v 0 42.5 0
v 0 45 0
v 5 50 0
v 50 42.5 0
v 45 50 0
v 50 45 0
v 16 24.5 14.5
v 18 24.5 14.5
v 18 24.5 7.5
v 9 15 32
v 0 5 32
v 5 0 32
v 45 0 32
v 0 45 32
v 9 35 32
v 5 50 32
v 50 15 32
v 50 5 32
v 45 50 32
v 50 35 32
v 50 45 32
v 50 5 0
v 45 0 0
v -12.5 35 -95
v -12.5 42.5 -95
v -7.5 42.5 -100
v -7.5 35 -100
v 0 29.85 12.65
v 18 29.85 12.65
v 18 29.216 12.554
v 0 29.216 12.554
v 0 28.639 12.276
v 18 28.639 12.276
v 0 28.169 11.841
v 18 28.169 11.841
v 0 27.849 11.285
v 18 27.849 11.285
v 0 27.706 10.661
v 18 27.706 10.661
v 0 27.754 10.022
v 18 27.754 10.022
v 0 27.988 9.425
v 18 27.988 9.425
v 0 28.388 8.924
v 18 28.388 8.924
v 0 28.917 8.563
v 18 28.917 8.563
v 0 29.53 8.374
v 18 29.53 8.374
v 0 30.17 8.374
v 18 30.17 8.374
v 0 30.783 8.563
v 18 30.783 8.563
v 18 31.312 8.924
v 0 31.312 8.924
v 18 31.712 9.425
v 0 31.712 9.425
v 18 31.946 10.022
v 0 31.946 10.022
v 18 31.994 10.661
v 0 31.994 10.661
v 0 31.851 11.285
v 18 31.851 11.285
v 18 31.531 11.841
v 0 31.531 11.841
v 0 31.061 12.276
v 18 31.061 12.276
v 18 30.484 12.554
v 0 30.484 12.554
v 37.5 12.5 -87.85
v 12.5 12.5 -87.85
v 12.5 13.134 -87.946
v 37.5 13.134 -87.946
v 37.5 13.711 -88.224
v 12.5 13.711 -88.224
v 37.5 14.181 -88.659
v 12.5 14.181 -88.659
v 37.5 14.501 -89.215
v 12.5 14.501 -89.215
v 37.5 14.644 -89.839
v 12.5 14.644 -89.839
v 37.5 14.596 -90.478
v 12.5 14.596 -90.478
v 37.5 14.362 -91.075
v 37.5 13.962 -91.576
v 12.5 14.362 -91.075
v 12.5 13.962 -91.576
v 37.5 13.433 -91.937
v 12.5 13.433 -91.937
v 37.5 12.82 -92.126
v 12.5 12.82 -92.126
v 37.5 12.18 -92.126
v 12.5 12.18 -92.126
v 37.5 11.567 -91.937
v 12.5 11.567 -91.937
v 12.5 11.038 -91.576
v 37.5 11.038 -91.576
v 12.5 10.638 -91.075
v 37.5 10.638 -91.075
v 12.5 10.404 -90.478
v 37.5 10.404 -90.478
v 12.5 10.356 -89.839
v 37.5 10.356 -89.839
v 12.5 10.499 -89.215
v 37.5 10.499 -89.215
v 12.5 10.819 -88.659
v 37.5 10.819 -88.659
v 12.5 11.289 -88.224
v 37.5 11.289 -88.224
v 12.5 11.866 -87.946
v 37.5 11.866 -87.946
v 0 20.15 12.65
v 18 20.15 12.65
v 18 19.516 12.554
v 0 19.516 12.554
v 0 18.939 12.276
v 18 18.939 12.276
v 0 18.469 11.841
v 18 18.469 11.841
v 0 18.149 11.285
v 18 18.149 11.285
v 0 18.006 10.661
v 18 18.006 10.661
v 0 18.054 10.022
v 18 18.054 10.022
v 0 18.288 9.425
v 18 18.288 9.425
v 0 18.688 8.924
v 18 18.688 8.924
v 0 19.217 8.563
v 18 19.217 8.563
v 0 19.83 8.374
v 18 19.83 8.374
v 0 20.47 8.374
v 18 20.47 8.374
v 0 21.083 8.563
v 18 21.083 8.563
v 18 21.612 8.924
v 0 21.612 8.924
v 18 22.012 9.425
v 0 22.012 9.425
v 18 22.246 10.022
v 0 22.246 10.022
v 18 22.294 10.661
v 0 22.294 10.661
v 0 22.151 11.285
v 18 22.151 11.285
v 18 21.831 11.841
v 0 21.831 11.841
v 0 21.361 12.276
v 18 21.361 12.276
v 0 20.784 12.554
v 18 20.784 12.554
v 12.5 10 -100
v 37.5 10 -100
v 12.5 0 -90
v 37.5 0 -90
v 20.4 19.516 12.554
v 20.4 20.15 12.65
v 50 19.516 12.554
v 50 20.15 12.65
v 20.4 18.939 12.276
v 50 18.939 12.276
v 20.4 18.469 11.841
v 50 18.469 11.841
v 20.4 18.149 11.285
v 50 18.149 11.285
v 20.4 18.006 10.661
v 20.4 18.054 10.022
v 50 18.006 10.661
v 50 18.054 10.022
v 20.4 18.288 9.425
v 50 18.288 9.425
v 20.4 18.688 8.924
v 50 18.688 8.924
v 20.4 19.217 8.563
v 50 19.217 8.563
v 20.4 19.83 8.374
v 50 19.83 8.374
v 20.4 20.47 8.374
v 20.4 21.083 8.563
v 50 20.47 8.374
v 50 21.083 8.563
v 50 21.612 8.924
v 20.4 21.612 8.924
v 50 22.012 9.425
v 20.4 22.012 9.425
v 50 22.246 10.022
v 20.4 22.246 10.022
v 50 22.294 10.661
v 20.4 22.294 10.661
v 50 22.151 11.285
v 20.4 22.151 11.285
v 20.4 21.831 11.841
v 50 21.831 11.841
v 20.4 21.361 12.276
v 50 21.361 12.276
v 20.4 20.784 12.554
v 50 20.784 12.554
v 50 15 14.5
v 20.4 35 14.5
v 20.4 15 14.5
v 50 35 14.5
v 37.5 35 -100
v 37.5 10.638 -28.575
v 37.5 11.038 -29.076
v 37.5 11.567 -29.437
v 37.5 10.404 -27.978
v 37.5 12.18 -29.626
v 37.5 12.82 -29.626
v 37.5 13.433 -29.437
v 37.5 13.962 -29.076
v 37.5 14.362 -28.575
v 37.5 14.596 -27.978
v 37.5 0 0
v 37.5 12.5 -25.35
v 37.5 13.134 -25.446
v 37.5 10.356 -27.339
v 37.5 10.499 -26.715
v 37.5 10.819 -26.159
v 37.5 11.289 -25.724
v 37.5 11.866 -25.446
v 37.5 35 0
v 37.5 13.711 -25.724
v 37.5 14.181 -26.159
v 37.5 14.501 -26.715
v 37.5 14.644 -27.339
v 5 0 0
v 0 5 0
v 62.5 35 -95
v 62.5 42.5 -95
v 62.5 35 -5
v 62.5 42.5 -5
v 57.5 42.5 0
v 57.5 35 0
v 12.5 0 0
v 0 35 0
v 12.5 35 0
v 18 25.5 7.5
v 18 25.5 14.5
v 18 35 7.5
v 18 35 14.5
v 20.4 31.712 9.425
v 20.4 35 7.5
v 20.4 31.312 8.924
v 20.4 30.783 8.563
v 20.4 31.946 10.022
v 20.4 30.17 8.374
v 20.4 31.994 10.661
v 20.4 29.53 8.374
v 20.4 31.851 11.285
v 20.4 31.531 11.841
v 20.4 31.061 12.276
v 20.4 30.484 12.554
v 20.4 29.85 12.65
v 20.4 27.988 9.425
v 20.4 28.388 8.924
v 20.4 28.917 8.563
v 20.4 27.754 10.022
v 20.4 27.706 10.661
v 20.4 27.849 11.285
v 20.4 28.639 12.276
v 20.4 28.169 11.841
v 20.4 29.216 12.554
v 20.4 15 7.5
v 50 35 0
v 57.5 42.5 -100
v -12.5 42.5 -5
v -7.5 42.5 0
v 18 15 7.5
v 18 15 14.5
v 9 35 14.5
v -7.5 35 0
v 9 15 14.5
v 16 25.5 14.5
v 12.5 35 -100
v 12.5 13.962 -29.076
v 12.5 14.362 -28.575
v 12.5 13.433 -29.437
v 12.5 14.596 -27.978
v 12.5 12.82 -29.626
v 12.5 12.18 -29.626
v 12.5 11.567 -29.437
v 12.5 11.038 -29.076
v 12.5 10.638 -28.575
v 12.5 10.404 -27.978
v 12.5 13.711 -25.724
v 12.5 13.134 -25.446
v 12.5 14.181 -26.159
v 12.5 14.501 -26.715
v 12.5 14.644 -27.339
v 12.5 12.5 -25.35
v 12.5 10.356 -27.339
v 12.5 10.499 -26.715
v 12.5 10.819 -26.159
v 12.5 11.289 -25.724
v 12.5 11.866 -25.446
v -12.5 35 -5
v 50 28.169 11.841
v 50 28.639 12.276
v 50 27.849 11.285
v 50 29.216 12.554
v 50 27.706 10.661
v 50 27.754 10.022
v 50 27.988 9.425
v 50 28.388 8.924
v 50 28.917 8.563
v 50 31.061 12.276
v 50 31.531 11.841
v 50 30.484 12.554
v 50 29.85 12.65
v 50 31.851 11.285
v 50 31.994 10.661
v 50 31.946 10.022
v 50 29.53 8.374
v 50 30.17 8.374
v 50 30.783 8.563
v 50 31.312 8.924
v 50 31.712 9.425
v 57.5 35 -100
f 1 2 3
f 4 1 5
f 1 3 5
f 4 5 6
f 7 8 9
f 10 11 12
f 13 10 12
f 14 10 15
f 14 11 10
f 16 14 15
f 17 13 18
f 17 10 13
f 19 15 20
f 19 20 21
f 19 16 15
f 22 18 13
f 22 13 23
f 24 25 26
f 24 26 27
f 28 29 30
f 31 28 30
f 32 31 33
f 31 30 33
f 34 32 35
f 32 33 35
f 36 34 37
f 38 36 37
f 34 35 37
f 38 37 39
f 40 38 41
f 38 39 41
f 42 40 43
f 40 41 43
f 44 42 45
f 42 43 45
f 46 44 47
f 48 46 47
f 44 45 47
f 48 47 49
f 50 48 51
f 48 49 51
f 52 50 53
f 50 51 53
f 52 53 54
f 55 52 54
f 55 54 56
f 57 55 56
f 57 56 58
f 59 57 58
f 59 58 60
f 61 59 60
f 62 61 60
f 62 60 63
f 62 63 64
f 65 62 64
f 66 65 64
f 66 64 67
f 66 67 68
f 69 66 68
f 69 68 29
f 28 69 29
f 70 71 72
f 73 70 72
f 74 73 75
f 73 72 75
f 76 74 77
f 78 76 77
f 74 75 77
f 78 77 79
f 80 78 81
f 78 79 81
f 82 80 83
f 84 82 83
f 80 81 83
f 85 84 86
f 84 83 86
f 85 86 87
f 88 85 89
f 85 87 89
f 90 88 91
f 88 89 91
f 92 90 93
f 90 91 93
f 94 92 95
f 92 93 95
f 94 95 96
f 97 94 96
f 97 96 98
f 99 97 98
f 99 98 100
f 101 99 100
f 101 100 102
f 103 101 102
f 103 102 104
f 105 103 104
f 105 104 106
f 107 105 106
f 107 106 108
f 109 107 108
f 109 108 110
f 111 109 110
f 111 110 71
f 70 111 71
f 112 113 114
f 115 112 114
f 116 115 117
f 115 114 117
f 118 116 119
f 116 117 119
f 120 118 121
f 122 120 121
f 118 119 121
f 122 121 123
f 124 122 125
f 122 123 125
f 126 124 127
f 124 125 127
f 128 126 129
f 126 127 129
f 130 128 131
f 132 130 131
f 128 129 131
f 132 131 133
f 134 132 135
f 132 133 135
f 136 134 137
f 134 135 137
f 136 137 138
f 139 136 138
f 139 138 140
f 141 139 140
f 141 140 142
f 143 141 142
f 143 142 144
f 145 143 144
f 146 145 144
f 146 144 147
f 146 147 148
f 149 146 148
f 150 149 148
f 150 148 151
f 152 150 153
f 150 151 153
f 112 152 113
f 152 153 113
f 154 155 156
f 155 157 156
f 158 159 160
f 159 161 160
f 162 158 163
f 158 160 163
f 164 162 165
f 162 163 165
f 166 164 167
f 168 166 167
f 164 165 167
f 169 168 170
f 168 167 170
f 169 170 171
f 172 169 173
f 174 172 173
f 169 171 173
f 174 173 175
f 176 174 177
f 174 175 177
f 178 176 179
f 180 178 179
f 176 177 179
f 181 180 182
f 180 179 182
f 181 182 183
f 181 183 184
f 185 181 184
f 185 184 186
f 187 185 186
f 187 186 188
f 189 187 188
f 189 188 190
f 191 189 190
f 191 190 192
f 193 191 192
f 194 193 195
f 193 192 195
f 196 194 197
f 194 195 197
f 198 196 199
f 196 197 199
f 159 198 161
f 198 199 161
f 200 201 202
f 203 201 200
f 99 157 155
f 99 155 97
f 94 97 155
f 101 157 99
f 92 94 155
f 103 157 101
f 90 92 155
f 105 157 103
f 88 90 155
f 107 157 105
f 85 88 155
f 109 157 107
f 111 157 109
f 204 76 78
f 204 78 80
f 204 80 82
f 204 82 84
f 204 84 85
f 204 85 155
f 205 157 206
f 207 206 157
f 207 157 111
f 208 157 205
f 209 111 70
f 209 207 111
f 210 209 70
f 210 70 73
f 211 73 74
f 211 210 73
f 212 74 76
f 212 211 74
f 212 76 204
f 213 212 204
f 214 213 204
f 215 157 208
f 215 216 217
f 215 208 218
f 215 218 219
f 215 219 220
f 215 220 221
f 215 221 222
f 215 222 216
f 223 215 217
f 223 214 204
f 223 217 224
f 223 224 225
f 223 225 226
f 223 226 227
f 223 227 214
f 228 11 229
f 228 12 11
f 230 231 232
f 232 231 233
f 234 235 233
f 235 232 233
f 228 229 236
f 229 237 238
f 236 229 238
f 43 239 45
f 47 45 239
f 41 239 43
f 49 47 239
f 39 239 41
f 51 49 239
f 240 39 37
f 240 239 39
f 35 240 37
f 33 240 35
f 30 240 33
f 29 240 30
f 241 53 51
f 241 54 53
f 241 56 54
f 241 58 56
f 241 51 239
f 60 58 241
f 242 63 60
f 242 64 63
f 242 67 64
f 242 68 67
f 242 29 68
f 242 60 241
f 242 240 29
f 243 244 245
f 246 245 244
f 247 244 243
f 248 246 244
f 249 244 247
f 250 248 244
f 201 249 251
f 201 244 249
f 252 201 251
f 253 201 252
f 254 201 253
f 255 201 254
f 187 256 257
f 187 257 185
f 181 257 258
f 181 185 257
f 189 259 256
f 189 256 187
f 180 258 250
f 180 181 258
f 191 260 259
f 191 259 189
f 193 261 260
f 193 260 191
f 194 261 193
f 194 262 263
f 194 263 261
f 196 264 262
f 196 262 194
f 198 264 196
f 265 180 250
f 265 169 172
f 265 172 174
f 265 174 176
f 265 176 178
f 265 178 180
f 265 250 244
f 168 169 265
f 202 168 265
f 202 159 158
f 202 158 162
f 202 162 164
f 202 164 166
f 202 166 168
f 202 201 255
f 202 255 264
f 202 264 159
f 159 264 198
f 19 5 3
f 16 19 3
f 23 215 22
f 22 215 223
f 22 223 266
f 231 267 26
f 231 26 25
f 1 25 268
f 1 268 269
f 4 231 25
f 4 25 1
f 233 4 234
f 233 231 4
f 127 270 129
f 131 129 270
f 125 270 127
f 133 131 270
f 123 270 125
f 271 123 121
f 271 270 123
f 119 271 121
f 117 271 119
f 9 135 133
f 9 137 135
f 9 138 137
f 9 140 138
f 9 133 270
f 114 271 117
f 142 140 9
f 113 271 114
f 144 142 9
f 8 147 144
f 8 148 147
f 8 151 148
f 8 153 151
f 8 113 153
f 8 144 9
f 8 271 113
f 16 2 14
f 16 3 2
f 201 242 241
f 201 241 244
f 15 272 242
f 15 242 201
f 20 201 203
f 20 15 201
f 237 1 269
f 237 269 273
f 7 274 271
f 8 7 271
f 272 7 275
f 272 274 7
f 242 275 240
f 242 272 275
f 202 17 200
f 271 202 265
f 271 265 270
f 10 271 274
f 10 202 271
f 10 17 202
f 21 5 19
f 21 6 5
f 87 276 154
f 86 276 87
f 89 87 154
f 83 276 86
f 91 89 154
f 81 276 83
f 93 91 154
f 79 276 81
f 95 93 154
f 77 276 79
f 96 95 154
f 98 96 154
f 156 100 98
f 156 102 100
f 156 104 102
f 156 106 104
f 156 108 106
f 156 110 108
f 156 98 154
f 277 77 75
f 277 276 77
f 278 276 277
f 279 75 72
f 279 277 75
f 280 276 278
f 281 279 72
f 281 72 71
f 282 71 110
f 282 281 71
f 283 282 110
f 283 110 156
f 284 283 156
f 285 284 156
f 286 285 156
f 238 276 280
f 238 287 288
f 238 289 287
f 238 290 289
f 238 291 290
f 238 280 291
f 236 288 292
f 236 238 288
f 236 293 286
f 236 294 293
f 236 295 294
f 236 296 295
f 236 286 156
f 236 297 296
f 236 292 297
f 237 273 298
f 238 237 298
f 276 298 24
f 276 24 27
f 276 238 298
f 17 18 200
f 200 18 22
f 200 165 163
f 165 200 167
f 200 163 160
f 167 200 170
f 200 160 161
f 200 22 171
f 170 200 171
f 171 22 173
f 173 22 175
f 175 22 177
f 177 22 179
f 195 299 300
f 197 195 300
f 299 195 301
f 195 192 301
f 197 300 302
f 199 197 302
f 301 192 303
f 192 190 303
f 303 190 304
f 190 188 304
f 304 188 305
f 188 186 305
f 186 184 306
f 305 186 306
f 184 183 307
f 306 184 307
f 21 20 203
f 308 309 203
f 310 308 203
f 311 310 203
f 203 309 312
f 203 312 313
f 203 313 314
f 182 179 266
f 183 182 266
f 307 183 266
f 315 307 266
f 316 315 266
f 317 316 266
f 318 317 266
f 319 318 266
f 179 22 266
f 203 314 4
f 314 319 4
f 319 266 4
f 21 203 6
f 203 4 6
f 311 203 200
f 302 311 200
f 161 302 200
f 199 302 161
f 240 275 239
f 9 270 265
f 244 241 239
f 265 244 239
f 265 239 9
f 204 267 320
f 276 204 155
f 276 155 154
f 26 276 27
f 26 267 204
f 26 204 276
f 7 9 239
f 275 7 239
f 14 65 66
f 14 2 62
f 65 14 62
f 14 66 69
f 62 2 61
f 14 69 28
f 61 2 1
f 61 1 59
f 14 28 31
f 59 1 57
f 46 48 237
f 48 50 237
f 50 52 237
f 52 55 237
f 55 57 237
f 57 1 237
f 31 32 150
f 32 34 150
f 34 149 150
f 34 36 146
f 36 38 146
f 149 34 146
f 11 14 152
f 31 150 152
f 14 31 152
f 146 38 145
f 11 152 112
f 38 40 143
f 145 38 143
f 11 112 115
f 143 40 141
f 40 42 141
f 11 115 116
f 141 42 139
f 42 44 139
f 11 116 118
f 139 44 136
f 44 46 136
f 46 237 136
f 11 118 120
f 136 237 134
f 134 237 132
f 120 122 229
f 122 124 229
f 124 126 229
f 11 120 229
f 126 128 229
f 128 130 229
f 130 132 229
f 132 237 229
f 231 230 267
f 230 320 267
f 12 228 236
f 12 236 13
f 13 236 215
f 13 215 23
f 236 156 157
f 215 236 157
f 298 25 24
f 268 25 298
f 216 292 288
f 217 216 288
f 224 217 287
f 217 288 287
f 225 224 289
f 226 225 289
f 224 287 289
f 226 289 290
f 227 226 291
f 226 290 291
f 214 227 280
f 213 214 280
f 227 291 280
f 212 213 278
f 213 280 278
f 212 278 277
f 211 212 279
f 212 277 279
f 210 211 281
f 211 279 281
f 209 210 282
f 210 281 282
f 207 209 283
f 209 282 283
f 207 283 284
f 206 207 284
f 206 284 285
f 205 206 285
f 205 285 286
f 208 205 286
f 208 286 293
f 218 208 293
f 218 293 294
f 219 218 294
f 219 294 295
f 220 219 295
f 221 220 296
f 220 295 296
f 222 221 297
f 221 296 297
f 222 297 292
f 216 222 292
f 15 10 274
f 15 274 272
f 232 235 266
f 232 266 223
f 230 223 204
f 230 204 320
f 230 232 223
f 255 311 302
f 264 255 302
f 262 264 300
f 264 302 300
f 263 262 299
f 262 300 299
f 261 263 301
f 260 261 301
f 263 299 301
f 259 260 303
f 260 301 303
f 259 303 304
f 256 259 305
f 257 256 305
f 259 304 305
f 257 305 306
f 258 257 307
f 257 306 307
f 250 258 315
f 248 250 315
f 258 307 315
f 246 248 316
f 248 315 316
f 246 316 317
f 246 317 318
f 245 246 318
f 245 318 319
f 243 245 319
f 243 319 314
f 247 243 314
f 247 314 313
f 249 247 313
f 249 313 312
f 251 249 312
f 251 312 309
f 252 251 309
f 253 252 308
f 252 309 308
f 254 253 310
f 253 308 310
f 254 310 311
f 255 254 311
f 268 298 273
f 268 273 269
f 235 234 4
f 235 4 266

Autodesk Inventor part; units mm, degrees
ref_plane "YZ Plane" through (0, 0, 0) normal (1, 0, 0) x (0, 1, 0)
ref_plane "XZ Plane" through (0, 0, 0) normal (0, 1, 0) x (-1, 0, 0)
ref_plane "XY Plane" through (0, 0, 0) normal (0, 0, 1) x (1, 0, 0)
sketch "Sketch1" plane through (0, 0, 0) normal (0, 0, 1) x (1, 0, 0)
  line L0 (0, 0) -> (50, 0)
  line L1 (50, 0) -> (50, 50)
  line L2 (50, 50) -> (0, 50)
  line L3 (0, 50) -> (0, 0)
  dimension "d0" = 50
  dimension "d1" = 50
extrude "Extrusion1" add sketch "Sketch1" along normal blind 32
sketch "Sketch2" plane through (0, 0, 32) normal (0, 0, 1) x (1, 0, 0)
  line L0 (50, 0) -> (50, 50) projected
  line L1 (50, 15) -> (9, 15)
  line L2 (9, 15) -> (9, 35)
  line L3 (9, 35) -> (50, 35)
  line L4 (50, 35) -> (50, 15)
  line L5 (0, 0) -> (50, 0) projected
  point P0 (50, 35)
  dimension "d4" = 41
  dimension "d5" = 20
  dimension "d6" = 15
extrude "Extrusion2" cut sketch "Sketch2" against normal blind 17.5
sketch "Sketch3" plane through (0, 0, 0) normal (-1, 0, 0) x (0, 0, 1)
  line L0 (32, 50) -> (32, 0) projected
  line L1 (32, 35) -> (10.5, 35) construction
  line L2 (32, 35) -> (53.5, 35) construction
  line L3 (10.5, 35) -> (10.5, 15) construction
  line L4 (10.5, 15) -> (32, 15) construction
  line L5 (0, 50) -> (32, 50) projected
  line L6 (32, 29.85) -> (10.5, 29.85) construction
  line L7 (32, 20.15) -> (10.5, 20.15) construction
  point P0 (0, 0)
  dimension "d9" = 21.5
  dimension "d10" = 180
  dimension "d11" = 20
  dimension "d12" = 15
  dimension "d13" = 5.15
  dimension "d14" = 5.15
hole "Hole1" at (0, 29.85, 10.5) at (0, 20.15, 10.5) direction (1, 0, 0) diameter 4.3 end through all
sketch "Sketch4" plane through (0, 0, 14.5) normal (0, 0, 1) x (1, 0, 0)
  line L0 (9, 35) -> (50, 35) projected
  line L1 (50, 15) -> (9, 15) projected
  line L2 (18, 35) -> (20.4, 35)
  line L3 (20.4, 35) -> (20.4, 15)
  line L4 (20.4, 15) -> (18, 15)
  line L5 (18, 15) -> (18, 35)
  line L6 (9, 15) -> (9, 35) projected
  point P0 (0, 0)
  point P1 (18, 15)
  dimension "d22" = 9
  dimension "d23" = 2.4
extrude "Extrusion3" cut sketch "Sketch4" against normal blind 7 contours L0 L3 L1 L5
chamfer "Chamfer1" distance 5 angle 45 4 edges at (0, 50, 16) (50, 50, 16) (0, 0, 16) (50, 0, 16)
sketch "Sketch7" plane through (0, 0, 14.5) normal (0, 0, 1) x (1, 0, 0)
  line L0 (18, 15) -> (18, 35) projected
  line L1 (18, 24.5) -> (16, 24.5)
  line L2 (16, 24.5) -> (16, 25.5)
  line L3 (16, 25.5) -> (18, 25.5)
  line L4 (18, 25.5) -> (18, 24.5)
  line L5 (9, 35) -> (50, 35) projected
  point P0 (0, 0)
  dimension "d45" = 2
  dimension "d46" = 1
  dimension "d47" = 9.5
extrude "Extrusion5" cut sketch "Sketch7" against normal blind 7
chamfer "Chamfer3" distance 7 distance2 2 1 edges at (16, 25, 7.5) measured on face at (16, 25.1667, 12.1667)
sketch "Sketch9" plane through (0, 0, 0) normal (0, 0, -1) x (-1, 0, 0)
  line L0 (-45, 50) -> (-5, 50) projected
  line L1 (-25, 50) -> (-25, 0) construction
  line L2 (-5, 0) -> (-45, 0) projected
  line L3 (-37.5, 0) -> (-37.5, 42.5)
  line L4 (-37.5, 42.5) -> (-12.5, 42.5)
  line L5 (-12.5, 42.5) -> (-12.5, 0)
  point P0 (0, 0)
  dimension "d61" = 42.5
  dimension "d62" = 25
  dimension "d63" = 12.5
extrude "Extrusion6" add sketch "Sketch9" along normal blind 100
sketch "Sketch10" plane through (12.5, 0, 0) normal (-1, 0, 0) x (0, 0, 1)
  line L0 (-100, 42.5) -> (-100, 0) projected
  line L1 (-100, 42.5) -> (0, 42.5)
  line L2 (0, 42.5) -> (0, 35)
  line L3 (0, 35) -> (-100, 35)
  line L4 (-100, 35) -> (-100, 42.5)
  point P0 (0, 0)
  dimension "d66" = 100
  dimension "d67" = 7.5
extrude "Extrusion7" add sketch "Sketch10" along normal blind 25 and the other way blind 50
chamfer "Chamfer4" distance 5 angle 45 4 edges at (-12.5, 38.75, 0) (-12.5, 38.75, -100) (62.5, 38.75, 0) (62.5, 38.75, -100)
chamfer "Chamfer5" distance 10 angle 45 1 edges at (25, 0, -100)
sketch "Sketch11" plane through (12.5, 0, 0) normal (-1, 0, 0) x (0, 0, 1)
  line L0 (-100, 10) -> (-100, 35) projected
  line L1 (-100, 12.5) -> (0, 12.5) construction
  line L2 (0, 0) -> (-90, 0) projected
  line L3 (-27.5, 0) -> (-27.5, 35) construction
  line L4 (-90, 0) -> (-90, 35) construction
  line L5 (-95, 35) -> (-5, 35) projected
  line L6 (0, 35) -> (0, 5) projected
  circle A0 centre (-90, 12.5) radius 2.15
  circle A1 centre (-27.5, 12.5) radius 2.15
  dimension "d78" = 12.5
  dimension "d79" = 27.5
  dimension "d80" = 10
  dimension "d81" = 4.3
  dimension "d82" = 4.3
extrude "Extrusion8" cut sketch "Sketch11" against normal through all
properties part number "ES117_MP1"
